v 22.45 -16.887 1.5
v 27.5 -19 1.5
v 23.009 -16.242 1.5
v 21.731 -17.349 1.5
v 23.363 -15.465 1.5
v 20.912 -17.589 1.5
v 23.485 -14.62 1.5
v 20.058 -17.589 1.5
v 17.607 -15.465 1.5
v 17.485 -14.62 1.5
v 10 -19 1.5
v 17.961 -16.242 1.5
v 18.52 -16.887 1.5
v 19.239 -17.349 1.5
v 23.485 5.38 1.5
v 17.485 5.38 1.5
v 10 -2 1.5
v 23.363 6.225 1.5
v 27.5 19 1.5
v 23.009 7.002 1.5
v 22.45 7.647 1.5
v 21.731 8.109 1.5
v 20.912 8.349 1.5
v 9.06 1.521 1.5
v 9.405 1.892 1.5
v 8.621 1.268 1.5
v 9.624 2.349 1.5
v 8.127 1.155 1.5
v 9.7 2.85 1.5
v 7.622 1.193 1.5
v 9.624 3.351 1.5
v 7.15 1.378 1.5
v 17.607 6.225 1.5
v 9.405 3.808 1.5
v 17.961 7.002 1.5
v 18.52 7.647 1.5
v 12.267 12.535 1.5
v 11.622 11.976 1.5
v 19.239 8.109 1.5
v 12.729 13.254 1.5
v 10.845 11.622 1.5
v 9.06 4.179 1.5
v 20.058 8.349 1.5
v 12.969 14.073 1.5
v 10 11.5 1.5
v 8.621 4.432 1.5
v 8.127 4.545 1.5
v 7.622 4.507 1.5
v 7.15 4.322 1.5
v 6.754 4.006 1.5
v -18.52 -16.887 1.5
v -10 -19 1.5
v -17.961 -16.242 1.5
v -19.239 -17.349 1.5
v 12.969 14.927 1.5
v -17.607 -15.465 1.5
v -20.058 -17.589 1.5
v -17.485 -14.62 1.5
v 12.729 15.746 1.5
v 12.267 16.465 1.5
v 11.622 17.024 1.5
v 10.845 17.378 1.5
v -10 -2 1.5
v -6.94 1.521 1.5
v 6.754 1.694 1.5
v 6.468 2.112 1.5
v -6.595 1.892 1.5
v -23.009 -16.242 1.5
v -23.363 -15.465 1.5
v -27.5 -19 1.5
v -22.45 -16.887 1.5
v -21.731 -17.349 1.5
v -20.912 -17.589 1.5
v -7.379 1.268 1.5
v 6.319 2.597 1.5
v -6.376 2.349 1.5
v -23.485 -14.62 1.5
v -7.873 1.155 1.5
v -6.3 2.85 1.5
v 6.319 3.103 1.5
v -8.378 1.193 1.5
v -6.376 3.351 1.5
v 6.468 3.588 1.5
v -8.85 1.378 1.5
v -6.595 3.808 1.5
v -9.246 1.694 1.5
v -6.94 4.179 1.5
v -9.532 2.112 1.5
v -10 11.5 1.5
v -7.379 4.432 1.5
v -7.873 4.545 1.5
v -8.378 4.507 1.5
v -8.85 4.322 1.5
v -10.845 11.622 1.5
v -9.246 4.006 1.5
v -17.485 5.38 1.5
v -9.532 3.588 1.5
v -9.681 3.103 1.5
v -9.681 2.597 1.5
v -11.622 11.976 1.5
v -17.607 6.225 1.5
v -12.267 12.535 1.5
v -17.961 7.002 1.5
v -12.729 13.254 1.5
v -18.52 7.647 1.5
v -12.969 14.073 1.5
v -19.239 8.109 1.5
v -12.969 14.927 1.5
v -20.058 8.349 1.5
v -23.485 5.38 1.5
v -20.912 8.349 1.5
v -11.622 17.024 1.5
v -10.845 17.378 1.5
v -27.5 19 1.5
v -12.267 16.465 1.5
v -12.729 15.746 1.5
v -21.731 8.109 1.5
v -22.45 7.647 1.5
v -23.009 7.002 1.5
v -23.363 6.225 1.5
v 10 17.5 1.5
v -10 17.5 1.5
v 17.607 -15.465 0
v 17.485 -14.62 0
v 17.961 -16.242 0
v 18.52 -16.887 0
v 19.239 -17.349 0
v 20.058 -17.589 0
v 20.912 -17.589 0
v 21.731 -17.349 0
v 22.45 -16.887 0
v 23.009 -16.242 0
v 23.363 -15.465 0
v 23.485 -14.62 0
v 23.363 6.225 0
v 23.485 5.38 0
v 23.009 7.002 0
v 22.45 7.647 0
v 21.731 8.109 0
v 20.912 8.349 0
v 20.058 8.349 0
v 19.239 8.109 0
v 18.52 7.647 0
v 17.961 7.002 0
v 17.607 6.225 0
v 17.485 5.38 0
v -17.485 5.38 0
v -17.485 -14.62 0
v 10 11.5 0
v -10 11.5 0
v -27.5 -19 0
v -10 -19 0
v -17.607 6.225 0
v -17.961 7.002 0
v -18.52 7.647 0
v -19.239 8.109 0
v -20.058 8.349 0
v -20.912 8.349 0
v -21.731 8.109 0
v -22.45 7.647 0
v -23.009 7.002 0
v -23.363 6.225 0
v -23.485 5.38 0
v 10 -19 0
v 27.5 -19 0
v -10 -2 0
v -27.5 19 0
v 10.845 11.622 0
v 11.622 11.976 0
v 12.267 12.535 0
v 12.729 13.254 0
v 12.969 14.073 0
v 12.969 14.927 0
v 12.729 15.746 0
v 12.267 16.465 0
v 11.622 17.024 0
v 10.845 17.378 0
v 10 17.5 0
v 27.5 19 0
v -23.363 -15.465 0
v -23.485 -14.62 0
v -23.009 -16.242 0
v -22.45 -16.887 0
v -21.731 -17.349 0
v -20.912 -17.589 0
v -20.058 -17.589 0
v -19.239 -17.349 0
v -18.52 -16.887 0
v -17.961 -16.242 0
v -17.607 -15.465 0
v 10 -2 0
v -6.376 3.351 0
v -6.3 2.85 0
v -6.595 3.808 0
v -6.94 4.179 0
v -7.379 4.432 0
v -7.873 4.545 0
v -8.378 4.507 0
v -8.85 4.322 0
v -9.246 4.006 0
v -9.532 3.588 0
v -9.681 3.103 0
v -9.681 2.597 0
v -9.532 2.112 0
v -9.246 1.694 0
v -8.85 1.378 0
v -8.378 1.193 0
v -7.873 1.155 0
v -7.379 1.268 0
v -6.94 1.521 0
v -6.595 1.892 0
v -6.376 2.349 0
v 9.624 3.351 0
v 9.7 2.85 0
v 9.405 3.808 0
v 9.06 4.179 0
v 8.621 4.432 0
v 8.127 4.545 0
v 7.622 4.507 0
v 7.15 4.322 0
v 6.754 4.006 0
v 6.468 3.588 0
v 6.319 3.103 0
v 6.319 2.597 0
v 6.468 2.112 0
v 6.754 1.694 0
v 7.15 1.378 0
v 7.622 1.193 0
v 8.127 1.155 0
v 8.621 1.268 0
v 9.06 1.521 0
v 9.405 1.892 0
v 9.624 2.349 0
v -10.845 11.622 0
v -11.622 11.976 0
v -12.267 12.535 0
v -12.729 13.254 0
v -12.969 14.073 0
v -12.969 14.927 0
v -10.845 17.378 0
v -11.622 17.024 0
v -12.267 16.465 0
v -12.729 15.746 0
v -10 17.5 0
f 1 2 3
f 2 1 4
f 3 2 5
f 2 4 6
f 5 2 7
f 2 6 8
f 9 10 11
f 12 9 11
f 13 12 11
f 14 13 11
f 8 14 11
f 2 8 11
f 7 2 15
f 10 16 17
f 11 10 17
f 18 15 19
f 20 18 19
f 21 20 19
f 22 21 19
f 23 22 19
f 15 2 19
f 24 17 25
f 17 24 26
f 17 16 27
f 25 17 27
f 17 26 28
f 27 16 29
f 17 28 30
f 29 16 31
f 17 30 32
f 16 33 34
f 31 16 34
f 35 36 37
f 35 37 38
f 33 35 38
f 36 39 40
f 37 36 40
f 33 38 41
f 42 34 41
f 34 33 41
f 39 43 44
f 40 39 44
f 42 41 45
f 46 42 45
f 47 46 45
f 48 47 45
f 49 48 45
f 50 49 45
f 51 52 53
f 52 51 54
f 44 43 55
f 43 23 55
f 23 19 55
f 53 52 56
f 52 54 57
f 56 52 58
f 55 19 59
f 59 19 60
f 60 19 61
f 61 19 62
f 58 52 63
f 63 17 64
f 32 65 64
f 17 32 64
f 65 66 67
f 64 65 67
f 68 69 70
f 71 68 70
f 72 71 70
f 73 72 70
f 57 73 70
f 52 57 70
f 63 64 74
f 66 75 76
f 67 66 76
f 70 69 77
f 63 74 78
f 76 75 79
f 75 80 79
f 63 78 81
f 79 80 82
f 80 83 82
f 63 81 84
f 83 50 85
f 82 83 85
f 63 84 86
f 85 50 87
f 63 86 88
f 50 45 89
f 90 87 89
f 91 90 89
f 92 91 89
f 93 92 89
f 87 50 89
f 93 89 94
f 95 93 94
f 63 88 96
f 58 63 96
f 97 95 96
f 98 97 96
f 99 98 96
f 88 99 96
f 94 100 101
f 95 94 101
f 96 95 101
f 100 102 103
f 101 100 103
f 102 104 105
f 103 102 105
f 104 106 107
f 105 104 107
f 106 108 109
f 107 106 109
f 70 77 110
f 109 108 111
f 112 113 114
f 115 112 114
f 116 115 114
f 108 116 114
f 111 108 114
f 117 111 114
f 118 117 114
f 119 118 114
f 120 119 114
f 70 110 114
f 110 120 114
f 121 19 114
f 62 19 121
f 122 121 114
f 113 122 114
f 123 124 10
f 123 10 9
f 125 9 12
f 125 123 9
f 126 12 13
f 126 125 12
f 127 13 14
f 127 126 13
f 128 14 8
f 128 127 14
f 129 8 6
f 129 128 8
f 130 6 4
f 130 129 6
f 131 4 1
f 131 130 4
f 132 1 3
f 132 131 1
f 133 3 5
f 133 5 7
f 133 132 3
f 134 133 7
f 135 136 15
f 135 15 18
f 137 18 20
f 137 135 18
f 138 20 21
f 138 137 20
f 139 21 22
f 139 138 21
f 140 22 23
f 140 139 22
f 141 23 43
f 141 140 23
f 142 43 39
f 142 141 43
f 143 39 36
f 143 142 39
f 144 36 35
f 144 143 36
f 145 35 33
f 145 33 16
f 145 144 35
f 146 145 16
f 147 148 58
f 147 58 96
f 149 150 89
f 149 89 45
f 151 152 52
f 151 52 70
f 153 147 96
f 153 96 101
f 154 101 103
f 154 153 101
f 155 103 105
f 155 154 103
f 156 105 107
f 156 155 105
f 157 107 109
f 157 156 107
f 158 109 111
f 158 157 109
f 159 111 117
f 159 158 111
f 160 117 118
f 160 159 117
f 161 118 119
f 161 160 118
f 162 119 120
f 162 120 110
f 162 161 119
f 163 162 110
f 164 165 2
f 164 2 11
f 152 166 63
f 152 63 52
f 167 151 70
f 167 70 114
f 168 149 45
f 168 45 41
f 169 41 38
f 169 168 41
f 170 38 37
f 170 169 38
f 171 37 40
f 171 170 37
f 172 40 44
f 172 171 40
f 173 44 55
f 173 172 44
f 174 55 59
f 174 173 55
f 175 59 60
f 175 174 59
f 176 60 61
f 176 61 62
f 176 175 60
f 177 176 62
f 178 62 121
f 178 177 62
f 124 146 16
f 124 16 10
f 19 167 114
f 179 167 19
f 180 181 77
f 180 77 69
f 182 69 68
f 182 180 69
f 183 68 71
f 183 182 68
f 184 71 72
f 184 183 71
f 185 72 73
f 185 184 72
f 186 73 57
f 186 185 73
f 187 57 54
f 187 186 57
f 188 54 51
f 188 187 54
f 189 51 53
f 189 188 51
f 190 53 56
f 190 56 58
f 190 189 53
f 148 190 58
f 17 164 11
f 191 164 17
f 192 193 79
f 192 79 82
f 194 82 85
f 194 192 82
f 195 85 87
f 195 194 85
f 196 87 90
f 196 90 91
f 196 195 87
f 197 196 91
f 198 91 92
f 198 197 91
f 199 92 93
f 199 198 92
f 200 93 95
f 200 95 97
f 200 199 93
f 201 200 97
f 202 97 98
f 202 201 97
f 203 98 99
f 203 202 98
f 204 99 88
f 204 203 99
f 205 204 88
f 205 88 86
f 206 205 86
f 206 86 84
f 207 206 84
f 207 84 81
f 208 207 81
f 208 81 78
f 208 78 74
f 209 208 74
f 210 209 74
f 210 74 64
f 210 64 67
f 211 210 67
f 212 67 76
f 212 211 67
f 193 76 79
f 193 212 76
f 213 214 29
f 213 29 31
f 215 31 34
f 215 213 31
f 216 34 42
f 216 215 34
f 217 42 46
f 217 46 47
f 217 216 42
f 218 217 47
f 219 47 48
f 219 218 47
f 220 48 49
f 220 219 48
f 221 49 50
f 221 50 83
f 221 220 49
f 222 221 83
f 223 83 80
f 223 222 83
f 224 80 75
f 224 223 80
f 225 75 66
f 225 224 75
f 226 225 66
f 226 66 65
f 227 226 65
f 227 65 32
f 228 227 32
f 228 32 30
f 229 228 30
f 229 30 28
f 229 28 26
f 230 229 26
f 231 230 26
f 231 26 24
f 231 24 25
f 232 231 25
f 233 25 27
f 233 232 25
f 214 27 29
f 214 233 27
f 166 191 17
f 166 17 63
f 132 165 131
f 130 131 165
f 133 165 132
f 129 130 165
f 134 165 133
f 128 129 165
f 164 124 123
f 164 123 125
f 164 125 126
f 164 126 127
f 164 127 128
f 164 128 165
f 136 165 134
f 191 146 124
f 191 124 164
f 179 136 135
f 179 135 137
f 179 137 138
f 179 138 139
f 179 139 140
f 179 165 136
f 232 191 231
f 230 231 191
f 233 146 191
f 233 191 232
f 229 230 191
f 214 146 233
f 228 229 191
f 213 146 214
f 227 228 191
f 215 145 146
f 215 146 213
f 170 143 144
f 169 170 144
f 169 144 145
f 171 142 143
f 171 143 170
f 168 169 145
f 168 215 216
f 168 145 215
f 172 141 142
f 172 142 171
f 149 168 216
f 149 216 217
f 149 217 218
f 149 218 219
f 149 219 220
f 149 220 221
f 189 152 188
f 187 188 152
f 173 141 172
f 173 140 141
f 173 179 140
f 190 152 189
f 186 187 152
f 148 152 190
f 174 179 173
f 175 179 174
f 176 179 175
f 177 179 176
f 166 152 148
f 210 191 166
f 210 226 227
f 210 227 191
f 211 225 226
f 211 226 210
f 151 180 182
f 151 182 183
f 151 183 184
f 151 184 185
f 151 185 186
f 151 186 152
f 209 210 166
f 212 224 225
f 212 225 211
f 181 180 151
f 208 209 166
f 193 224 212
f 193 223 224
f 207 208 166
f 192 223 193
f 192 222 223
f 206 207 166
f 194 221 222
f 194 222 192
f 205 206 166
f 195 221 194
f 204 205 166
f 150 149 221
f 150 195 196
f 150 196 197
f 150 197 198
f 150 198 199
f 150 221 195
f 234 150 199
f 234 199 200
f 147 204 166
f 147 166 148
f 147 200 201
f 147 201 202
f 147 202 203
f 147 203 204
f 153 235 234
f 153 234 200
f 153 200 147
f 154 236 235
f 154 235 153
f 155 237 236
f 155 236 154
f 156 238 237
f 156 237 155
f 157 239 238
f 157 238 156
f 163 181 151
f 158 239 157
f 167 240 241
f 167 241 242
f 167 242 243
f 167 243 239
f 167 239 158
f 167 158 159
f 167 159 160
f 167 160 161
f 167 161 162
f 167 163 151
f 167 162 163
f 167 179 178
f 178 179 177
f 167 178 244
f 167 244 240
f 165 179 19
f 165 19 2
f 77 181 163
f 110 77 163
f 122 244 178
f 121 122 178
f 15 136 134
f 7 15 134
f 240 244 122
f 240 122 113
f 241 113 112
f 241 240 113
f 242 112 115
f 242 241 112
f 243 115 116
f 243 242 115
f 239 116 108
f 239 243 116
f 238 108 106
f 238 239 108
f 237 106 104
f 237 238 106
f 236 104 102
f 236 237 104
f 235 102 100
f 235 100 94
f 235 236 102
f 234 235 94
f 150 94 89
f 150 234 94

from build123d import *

# Parameters (mm, degrees)
SKETCH_R  = 1.7
PAD_DEPTH = 1.5


with BuildPart() as part:
    # Sketch → Pad (new body)
    with BuildSketch(Plane.XY):
        Polygon((-27.5, 19), (27.5, 19), (27.5, -19), (10, -19), (10, -2), (-10, -2), (-10, -19), (-27.5, -19), align=None)
        with Locations((-8, 2.85)):
            Circle(SKETCH_R, mode=Mode.SUBTRACT)
        with Locations((8, 2.85)):
            Circle(SKETCH_R, mode=Mode.SUBTRACT)
        with BuildLine():
            ThreePointArc((-10, 17.5), (-13, 14.5), (-10, 11.5))
            Line((-10, 11.5), (10, 11.5))
            ThreePointArc((10, 11.5), (13, 14.5), (10, 17.5))
            Line((-10, 17.5), (10, 17.5))
        make_face(mode=Mode.SUBTRACT)
        with BuildLine():
            ThreePointArc((23.485, 5.38), (20.485, 8.38), (17.485, 5.38))
            Line((17.485, 5.38), (17.485, -14.62))
            ThreePointArc((17.485, -14.62), (20.485, -17.62), (23.485, -14.62))
            Line((23.485, 5.38), (23.485, -14.62))
        make_face(mode=Mode.SUBTRACT)
        with BuildLine():
            ThreePointArc((-23.485, -14.62), (-20.485, -17.62), (-17.485, -14.62))
            Line((-17.485, -14.62), (-17.485, 5.38))
            ThreePointArc((-17.485, 5.38), (-20.485, 8.38), (-23.485, 5.38))
            Line((-23.485, -14.62), (-23.485, 5.38))
        make_face(mode=Mode.SUBTRACT)
    extrude(amount=PAD_DEPTH)


solid = part.part
